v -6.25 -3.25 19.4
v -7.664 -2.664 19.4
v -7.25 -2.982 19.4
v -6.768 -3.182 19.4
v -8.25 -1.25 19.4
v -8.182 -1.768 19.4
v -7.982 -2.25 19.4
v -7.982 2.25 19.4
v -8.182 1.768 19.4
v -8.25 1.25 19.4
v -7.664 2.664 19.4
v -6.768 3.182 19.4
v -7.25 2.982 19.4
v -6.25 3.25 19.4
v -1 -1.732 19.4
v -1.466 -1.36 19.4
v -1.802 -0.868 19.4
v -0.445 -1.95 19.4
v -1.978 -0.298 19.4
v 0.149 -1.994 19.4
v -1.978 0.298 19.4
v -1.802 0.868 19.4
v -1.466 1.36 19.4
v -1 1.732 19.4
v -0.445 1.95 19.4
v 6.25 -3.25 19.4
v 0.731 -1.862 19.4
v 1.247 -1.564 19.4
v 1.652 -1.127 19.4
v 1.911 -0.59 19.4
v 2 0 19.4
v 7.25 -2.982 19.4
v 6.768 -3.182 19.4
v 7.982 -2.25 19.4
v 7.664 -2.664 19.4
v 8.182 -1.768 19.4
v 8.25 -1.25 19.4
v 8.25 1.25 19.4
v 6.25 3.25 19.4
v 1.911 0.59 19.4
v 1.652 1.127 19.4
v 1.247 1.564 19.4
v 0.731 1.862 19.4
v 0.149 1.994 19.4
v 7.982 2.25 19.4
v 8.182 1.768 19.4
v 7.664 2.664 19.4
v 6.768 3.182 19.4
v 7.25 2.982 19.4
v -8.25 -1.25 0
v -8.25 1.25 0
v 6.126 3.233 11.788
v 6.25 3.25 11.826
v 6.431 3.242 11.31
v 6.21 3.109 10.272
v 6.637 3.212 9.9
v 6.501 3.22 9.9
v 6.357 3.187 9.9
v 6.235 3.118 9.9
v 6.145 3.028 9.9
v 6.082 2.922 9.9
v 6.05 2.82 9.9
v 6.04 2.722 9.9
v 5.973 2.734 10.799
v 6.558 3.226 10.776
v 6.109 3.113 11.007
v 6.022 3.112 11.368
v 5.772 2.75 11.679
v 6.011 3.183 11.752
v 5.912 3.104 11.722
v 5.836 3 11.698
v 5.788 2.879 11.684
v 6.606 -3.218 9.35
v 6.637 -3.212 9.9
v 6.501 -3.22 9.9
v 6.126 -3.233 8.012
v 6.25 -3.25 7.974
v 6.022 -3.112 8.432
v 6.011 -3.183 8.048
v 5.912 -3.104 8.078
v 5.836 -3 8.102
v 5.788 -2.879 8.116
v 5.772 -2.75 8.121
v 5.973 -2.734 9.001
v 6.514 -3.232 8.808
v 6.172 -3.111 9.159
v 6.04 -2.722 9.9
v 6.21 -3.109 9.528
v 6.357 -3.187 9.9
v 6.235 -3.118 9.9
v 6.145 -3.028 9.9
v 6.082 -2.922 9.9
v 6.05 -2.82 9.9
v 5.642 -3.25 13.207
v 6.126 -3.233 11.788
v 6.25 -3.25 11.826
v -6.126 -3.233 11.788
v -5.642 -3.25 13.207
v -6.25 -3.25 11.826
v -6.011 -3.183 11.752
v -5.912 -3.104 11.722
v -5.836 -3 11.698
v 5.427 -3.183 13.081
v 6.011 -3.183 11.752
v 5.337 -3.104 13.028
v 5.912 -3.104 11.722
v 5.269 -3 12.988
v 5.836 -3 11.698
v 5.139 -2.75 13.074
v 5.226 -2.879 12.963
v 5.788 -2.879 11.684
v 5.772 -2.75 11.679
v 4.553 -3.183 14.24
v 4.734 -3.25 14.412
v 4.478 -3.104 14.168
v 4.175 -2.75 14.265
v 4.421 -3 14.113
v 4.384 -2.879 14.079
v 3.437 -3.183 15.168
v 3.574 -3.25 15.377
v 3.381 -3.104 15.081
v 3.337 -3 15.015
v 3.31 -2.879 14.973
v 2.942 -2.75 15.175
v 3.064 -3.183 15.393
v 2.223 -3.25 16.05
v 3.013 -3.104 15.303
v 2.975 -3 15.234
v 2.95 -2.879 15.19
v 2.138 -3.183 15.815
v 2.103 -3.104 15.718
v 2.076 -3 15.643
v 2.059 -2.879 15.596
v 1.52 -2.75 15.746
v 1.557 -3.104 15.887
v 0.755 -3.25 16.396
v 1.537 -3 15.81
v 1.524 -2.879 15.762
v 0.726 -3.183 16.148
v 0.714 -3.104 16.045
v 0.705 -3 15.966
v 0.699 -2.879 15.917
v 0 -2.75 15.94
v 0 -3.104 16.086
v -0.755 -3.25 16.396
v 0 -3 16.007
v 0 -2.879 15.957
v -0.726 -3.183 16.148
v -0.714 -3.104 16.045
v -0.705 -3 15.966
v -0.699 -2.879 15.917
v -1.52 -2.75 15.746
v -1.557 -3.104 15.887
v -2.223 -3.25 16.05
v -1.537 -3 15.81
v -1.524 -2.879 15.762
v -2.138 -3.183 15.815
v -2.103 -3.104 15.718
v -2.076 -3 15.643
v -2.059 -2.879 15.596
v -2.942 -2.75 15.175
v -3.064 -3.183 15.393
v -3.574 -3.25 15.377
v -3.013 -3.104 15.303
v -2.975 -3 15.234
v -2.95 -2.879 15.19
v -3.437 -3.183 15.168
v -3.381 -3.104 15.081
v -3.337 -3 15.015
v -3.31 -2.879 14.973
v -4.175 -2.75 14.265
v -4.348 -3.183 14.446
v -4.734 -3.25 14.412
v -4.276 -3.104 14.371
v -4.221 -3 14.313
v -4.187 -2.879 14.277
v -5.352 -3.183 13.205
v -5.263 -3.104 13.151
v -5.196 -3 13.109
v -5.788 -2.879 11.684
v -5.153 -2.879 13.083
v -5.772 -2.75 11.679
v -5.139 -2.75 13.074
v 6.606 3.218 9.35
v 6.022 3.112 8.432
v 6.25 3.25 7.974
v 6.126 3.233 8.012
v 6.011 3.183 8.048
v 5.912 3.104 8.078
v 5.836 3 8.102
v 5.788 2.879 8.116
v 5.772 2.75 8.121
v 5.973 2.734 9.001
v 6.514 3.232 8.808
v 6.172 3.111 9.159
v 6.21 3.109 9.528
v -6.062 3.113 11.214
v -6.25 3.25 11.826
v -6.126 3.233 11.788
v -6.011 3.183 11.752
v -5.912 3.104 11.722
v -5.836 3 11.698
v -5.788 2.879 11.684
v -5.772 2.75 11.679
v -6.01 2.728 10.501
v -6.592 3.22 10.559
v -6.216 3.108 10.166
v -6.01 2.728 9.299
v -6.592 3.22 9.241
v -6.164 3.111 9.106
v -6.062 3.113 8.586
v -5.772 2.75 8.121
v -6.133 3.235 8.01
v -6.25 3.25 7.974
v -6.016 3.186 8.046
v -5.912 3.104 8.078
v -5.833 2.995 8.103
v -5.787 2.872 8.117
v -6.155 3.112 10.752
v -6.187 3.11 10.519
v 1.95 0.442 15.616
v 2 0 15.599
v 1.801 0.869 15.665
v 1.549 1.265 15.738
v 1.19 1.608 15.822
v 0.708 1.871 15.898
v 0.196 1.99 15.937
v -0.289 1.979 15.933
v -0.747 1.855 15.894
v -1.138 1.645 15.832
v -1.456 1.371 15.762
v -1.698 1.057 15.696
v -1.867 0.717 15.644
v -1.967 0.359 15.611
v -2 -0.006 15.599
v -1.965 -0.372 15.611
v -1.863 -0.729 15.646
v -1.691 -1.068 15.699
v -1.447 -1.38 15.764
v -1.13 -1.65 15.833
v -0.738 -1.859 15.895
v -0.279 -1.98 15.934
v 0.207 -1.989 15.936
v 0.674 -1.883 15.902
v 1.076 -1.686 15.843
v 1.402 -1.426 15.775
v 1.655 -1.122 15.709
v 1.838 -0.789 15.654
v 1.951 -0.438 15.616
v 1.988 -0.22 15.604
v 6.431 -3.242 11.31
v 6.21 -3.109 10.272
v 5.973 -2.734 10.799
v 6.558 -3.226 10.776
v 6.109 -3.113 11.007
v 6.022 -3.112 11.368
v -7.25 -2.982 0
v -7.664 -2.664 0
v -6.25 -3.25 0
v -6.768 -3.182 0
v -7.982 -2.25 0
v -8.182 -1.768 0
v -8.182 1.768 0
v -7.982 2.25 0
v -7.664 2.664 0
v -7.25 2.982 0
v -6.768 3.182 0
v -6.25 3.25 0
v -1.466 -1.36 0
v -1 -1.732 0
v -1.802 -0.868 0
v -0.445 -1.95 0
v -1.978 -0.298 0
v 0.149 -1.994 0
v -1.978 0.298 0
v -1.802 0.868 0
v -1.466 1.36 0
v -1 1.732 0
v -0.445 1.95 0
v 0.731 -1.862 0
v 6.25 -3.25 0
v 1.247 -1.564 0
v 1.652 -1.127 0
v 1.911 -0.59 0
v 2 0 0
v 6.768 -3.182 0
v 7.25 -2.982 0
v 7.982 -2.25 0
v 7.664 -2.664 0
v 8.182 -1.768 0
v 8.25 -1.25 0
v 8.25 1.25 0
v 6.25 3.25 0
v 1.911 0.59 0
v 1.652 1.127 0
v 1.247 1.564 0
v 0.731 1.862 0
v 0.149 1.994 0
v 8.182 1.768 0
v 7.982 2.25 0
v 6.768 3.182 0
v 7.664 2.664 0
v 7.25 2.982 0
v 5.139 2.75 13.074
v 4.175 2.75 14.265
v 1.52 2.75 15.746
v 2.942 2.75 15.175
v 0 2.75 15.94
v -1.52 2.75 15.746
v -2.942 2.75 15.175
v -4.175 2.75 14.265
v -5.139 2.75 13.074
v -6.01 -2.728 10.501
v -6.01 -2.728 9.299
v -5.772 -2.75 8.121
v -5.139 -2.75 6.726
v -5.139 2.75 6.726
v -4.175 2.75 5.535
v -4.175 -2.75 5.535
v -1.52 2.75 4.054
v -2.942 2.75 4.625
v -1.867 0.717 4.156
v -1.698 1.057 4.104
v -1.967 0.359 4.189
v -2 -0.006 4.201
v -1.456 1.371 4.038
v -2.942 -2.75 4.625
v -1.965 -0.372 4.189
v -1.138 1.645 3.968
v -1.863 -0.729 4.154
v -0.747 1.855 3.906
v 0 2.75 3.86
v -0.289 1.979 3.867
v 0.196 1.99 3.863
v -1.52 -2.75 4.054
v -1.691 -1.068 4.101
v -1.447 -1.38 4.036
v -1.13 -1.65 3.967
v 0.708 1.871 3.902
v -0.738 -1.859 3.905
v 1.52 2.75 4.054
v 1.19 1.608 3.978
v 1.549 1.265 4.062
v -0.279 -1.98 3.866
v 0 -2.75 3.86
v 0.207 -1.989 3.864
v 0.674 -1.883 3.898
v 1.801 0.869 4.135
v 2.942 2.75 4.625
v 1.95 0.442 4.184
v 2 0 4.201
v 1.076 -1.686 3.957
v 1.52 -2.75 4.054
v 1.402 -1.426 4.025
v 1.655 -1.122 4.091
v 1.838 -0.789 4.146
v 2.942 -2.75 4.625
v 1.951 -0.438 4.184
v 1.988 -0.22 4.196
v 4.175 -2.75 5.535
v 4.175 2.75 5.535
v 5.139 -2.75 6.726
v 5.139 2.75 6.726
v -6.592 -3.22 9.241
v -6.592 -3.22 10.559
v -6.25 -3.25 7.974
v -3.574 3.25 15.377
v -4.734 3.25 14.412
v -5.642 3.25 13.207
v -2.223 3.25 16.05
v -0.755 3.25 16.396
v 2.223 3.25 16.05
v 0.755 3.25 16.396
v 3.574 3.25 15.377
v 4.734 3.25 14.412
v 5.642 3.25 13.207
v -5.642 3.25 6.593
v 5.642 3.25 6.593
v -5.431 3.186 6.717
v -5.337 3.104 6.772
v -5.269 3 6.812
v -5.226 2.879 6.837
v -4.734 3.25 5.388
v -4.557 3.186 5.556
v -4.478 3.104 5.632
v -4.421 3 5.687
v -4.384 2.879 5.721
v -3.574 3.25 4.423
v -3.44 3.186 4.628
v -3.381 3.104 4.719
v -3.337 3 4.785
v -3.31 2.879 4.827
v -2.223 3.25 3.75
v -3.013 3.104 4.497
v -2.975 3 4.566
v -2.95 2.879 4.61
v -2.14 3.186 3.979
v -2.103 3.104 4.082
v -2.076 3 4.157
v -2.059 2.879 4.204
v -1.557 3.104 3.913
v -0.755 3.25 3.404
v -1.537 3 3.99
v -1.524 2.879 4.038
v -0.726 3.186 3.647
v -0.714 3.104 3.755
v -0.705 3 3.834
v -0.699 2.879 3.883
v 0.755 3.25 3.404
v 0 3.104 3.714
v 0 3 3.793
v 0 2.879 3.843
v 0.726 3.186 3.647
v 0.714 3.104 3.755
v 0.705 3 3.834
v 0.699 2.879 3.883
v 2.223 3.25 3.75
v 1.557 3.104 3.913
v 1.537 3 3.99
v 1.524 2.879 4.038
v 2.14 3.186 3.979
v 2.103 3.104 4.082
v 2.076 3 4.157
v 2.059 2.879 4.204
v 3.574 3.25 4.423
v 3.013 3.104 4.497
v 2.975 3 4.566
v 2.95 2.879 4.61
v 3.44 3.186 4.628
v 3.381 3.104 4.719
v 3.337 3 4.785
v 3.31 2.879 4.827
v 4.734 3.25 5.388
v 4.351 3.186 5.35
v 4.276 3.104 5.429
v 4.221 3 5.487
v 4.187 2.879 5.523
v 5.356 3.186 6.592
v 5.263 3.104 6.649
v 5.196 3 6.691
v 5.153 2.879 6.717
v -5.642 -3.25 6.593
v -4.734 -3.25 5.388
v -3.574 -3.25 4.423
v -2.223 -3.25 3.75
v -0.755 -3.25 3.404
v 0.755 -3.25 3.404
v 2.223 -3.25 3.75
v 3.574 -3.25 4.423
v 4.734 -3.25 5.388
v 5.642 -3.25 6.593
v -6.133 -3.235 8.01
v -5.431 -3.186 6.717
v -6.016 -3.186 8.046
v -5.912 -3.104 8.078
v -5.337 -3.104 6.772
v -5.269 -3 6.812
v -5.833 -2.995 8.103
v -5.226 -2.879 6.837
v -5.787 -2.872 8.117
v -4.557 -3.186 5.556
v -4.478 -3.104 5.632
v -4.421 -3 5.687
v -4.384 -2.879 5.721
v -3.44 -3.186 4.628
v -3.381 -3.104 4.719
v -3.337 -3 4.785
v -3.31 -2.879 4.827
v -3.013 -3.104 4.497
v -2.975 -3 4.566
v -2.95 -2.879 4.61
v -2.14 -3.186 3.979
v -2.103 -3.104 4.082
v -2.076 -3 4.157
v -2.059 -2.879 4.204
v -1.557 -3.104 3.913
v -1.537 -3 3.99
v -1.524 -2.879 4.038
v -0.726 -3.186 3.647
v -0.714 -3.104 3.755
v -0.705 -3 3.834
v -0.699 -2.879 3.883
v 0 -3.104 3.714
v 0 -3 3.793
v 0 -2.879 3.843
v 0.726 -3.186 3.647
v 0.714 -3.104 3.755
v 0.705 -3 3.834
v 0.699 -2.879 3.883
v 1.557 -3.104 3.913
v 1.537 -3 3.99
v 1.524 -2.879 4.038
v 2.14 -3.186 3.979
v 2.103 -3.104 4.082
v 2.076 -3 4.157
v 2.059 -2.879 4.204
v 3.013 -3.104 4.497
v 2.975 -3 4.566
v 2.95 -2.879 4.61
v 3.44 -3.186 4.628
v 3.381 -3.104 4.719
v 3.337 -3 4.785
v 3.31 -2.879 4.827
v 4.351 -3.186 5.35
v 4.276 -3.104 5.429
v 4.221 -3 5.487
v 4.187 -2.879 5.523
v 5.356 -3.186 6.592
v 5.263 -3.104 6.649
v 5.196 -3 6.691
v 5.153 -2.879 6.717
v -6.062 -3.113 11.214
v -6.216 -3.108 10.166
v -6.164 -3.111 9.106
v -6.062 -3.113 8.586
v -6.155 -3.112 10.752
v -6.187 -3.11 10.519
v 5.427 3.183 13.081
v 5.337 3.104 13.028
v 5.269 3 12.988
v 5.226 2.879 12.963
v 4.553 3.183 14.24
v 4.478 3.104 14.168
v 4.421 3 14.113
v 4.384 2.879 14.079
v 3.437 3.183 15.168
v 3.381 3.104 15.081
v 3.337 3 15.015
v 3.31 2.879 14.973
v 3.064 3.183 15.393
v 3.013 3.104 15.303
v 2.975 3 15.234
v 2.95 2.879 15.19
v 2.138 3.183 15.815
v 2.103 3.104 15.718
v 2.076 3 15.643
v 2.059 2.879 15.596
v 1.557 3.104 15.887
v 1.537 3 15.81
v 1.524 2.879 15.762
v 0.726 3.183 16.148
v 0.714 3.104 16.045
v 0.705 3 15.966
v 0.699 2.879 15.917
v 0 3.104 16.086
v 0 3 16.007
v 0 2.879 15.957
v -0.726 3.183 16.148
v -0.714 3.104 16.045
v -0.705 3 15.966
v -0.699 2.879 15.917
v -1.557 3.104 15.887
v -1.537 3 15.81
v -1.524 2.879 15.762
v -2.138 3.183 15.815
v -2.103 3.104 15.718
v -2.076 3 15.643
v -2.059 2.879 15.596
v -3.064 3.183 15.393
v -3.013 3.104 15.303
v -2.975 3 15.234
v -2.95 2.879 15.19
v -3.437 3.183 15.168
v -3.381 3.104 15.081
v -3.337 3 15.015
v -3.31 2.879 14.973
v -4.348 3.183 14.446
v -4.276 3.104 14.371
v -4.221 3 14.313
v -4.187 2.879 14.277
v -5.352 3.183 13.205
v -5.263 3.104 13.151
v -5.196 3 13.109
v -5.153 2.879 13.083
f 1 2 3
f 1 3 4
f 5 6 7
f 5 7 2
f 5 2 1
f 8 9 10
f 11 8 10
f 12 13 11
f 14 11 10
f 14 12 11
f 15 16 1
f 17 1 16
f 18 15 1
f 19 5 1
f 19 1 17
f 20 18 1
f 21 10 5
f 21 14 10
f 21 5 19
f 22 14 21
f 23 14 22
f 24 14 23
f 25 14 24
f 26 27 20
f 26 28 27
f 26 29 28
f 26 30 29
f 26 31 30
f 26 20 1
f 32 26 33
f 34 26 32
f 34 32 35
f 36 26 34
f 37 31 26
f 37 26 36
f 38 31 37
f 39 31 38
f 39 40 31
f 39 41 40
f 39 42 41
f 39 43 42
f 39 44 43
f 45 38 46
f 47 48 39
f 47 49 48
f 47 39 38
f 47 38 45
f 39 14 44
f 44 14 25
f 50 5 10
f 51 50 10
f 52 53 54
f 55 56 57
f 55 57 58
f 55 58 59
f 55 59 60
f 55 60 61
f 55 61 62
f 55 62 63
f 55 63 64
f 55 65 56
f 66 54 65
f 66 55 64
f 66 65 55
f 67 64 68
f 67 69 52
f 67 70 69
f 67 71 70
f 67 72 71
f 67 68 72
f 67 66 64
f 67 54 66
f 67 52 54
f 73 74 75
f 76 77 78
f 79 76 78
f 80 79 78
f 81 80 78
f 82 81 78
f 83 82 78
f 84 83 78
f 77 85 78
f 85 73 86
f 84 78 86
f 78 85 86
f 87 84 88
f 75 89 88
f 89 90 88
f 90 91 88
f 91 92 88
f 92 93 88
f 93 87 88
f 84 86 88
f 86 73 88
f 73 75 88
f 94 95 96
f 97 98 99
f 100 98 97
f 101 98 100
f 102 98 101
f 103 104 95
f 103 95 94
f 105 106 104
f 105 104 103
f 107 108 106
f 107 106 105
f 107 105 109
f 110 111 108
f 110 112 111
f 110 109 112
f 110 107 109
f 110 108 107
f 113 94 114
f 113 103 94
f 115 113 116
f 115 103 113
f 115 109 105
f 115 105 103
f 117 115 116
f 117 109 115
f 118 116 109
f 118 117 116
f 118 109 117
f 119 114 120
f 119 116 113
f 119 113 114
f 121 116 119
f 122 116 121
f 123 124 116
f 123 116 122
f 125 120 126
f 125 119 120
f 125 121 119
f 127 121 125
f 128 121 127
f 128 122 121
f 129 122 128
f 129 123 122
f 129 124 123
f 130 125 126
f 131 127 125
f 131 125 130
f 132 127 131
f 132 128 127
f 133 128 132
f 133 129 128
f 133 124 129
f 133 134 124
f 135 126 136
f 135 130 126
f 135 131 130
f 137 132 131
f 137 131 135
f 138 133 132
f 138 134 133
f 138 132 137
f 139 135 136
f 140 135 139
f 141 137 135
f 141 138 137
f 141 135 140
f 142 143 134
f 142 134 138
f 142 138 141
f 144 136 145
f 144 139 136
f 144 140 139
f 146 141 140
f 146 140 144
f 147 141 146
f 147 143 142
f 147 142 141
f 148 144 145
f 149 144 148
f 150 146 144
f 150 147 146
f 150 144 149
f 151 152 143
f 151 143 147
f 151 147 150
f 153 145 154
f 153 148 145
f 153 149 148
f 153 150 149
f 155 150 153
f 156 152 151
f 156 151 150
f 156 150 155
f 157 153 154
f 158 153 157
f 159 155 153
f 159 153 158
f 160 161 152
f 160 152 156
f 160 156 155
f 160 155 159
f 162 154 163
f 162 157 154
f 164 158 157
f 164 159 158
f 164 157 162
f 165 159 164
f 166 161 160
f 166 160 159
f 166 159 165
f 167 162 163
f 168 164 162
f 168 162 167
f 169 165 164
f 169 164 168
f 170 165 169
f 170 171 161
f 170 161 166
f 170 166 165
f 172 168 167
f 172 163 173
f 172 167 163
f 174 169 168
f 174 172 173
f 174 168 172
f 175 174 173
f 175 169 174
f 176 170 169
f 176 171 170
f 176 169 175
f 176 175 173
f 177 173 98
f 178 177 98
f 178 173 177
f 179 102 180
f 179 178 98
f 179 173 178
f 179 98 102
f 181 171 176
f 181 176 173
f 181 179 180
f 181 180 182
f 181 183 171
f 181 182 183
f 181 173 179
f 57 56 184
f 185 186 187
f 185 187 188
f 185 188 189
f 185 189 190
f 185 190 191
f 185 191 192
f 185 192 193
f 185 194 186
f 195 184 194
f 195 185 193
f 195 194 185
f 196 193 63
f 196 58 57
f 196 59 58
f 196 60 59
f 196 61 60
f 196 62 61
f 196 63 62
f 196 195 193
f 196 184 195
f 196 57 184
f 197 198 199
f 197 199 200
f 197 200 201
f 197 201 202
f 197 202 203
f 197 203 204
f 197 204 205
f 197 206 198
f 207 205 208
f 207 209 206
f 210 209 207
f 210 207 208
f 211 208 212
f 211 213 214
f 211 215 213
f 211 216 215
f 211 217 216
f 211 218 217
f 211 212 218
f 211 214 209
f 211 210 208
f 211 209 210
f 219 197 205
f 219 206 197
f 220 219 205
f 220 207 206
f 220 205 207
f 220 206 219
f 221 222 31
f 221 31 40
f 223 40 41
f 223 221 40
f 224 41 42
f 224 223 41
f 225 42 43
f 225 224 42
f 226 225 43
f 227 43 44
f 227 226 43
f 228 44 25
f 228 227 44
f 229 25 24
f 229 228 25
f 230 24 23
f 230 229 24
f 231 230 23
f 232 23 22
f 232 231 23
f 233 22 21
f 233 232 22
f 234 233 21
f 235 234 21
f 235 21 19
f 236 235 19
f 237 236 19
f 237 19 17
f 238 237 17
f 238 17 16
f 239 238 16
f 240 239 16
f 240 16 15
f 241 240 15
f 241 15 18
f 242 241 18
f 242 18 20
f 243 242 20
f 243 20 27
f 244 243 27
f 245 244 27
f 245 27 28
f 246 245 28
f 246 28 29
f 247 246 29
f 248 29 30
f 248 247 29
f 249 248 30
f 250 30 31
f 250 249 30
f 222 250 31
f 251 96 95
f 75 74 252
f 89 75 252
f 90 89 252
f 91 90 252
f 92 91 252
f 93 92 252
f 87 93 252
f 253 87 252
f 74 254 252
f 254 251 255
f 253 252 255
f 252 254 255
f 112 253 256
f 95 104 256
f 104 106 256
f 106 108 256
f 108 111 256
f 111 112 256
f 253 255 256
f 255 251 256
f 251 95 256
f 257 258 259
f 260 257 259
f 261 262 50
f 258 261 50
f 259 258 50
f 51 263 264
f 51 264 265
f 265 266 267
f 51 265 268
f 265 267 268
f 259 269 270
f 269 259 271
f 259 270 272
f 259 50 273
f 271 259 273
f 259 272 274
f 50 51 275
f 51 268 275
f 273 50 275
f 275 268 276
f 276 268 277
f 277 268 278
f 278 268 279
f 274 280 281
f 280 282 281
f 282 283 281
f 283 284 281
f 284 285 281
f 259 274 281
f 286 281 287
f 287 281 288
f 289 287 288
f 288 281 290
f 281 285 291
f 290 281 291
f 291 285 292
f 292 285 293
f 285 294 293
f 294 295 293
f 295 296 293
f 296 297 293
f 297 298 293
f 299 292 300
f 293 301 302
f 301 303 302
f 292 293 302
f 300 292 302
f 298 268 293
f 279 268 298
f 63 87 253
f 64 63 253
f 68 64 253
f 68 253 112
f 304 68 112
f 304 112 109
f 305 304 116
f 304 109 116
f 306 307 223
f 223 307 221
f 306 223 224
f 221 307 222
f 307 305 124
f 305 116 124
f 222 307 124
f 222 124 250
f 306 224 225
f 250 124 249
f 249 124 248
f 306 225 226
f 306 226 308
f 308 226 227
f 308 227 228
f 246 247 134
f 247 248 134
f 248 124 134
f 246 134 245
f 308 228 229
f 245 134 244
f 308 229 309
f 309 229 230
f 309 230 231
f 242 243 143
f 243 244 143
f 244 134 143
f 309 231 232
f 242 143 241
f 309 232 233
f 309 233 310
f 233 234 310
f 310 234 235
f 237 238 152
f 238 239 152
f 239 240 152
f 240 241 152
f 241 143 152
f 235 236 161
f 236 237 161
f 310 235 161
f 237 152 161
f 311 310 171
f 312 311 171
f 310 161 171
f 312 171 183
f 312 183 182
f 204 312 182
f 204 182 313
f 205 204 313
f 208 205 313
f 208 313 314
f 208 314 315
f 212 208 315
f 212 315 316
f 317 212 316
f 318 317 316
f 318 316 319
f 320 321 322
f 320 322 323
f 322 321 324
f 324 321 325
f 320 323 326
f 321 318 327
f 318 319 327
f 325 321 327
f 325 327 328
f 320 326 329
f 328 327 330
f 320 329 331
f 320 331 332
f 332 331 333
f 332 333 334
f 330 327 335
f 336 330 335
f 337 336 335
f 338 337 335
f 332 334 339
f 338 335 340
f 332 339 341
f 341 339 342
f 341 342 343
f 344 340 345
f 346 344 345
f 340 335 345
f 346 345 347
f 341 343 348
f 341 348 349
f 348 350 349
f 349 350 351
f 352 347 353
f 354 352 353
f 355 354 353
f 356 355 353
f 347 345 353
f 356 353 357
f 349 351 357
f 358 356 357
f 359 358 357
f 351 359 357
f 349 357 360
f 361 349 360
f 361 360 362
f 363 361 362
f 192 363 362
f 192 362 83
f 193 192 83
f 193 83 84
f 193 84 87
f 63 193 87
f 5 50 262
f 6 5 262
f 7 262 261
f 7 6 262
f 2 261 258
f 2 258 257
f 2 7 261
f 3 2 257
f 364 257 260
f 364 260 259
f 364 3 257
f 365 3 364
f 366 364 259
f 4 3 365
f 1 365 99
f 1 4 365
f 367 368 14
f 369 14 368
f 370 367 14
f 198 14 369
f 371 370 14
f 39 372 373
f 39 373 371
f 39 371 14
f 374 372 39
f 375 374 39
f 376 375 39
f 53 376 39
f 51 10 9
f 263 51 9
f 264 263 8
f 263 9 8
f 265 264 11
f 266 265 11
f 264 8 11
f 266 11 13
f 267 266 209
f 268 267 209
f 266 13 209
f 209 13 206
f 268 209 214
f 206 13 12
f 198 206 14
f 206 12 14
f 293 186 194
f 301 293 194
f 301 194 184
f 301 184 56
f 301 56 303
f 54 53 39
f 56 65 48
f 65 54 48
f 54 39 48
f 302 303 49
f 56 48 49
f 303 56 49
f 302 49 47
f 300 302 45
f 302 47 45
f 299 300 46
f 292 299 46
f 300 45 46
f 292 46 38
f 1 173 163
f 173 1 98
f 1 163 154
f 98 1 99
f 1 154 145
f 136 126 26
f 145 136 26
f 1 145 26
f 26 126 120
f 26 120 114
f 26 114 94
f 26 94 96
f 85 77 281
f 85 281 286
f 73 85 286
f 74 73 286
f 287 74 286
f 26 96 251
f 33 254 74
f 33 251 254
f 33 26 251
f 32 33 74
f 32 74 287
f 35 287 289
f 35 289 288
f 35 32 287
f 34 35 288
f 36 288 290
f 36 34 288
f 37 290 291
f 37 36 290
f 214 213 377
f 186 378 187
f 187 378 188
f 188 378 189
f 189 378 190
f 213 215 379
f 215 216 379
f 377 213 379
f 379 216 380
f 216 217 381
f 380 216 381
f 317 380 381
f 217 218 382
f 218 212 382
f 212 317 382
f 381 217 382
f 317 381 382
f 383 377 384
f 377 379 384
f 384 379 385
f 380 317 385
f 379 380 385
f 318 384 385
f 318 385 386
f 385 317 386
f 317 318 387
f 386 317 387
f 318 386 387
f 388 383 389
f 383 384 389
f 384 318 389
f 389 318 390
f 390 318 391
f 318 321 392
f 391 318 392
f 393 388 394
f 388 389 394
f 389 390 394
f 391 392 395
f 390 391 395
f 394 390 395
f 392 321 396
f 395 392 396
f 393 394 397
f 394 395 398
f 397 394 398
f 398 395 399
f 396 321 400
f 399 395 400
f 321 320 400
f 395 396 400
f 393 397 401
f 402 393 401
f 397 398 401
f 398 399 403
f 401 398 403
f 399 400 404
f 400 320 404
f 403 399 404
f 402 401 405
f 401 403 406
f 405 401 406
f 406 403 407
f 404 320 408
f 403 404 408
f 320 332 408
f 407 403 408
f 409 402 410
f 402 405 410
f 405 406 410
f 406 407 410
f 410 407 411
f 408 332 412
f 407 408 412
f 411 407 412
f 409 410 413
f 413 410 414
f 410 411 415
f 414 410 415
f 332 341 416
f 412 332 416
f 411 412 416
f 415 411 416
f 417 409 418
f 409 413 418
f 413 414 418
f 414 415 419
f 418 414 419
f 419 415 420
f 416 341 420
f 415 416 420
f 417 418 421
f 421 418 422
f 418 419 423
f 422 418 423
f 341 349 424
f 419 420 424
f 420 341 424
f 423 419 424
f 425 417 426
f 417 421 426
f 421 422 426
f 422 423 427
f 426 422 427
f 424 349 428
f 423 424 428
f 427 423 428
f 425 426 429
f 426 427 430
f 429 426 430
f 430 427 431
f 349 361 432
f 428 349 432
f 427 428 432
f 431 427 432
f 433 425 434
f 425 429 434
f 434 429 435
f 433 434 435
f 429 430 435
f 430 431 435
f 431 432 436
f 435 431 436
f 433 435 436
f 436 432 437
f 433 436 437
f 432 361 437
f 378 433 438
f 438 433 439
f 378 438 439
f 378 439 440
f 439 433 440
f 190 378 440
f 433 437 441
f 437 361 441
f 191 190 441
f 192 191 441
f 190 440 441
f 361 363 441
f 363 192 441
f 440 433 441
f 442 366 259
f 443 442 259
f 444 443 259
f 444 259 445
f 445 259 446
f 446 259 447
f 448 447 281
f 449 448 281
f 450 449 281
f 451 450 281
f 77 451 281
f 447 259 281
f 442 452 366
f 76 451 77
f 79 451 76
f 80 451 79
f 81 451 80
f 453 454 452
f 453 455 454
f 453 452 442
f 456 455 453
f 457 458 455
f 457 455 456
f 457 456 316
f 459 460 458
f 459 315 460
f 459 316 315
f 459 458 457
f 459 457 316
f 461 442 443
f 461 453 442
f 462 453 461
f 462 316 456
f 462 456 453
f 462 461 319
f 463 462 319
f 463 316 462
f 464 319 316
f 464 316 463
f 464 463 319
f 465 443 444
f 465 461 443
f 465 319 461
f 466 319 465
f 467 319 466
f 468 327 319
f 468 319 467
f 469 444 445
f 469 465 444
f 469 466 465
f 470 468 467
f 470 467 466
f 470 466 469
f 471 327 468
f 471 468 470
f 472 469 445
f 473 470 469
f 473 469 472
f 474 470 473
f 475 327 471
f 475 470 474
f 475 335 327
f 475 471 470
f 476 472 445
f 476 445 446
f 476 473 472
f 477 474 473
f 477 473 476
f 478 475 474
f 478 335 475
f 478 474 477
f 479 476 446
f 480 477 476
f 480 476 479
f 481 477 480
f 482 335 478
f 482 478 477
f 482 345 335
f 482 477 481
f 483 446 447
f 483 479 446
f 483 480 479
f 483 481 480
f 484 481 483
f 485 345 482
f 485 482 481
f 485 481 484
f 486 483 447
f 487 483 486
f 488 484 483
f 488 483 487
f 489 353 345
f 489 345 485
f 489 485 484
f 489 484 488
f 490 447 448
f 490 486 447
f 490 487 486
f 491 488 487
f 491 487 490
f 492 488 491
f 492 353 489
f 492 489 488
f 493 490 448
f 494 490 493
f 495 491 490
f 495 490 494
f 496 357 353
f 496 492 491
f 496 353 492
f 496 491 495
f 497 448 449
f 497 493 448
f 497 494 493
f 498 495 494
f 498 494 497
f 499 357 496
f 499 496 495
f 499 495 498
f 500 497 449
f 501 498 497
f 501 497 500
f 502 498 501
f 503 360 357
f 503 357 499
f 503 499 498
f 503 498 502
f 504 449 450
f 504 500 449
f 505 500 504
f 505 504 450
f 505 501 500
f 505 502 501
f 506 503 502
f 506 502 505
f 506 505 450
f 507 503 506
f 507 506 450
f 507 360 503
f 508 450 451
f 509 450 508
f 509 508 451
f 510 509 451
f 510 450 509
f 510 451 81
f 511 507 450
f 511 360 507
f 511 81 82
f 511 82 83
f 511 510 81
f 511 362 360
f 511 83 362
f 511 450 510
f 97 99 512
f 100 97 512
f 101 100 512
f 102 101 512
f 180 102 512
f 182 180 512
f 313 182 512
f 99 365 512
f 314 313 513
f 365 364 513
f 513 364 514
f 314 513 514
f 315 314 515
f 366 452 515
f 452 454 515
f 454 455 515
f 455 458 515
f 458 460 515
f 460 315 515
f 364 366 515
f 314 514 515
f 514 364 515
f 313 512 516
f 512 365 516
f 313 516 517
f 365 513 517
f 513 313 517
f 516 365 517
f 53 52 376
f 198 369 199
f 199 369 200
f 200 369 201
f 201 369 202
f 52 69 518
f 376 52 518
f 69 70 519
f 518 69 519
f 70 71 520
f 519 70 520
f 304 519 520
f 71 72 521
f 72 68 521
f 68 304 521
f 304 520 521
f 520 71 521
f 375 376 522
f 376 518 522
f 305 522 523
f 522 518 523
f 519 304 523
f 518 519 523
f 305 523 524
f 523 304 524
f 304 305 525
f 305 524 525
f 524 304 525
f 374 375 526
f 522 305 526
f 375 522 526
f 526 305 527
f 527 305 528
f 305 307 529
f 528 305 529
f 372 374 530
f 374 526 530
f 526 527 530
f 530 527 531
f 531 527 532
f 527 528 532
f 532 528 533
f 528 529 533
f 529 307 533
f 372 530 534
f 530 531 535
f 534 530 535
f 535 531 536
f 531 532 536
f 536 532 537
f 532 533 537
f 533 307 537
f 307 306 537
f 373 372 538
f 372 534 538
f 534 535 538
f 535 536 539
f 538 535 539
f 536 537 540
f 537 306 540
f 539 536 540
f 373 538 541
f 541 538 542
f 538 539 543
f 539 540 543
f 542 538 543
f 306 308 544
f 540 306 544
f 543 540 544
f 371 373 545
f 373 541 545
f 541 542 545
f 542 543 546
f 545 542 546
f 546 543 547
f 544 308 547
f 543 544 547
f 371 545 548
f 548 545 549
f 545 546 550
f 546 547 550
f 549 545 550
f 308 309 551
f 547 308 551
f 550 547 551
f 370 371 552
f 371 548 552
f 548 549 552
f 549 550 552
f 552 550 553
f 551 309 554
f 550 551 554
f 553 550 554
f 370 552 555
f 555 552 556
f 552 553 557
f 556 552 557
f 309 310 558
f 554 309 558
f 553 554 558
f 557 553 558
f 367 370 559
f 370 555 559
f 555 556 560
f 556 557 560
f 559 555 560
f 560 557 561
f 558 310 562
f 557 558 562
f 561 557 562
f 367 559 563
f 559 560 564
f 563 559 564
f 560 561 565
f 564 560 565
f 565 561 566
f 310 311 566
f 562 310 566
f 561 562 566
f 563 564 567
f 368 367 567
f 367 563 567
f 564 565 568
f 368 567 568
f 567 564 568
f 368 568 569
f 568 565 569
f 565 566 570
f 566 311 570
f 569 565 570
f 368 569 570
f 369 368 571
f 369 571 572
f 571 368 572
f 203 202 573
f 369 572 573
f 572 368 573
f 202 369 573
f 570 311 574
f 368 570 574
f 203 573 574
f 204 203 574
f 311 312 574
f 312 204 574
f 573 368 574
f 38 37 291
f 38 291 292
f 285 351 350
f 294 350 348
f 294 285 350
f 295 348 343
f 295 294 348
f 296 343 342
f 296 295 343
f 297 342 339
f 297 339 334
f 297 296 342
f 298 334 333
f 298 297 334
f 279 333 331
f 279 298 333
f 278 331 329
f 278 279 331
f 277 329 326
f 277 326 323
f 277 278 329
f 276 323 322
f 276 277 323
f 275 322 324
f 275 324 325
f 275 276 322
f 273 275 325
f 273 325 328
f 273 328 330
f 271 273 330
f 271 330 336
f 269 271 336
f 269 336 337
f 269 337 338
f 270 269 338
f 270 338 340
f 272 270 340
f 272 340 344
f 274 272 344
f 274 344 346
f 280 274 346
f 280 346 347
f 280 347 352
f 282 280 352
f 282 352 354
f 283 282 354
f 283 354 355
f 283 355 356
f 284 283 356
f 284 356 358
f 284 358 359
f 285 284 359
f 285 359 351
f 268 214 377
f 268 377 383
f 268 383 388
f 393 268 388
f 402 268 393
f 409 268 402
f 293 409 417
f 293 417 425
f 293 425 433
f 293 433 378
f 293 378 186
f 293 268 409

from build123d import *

# Parameters (mm, degrees)
F0_W          = 16.5
F0_H          = 6.5
F0_R          = 2
F1_DEPTH      = 19.4
F2_R          = 6.04
F3_DEPTH      = 25
F3_DEPTH_BACK = 25
F4_DEPTH      = 3
F5_R          = 2
F6_R          = 0.5


with BuildPart() as f1:
    # F0 (on Top) → F1 (new body)
    with BuildSketch(Plane.XY):
        Rectangle(F0_W, F0_H)
        Circle(F0_R, mode=Mode.SUBTRACT)
    extrude(amount=F1_DEPTH)

    # F2 (on face) → F3 (cut, two sides)
    with BuildSketch(Plane.XZ.offset(3.25)) as f3_sk:
        with Locations((0, 9.9)):
            Circle(F2_R)
    extrude(amount=-F3_DEPTH, mode=Mode.SUBTRACT)
    extrude(f3_sk.sketch, amount=-F3_DEPTH_BACK, mode=Mode.SUBTRACT)

    # F0 (on Top) → F4 (cut)
    with BuildSketch(Plane.XY):
        Rectangle(F0_W, F0_H)
        Circle(F0_R, mode=Mode.SUBTRACT)
    extrude(amount=-F4_DEPTH, mode=Mode.SUBTRACT)

    # F5
    f5_edges = [f1.edges().sort_by_distance(p)[0] for p in [
        (8.25, -3.25, 9.7),
        (-8.25, -3.25, 9.7),
        (-8.25, 3.25, 9.7),
        (8.25, 3.25, 9.7),
    ]]
    fillet(f5_edges, radius=F5_R)

    # F6
    f6_edges = [f1.edges().sort_by_distance(p)[0] for p in [
        (-6.04, -3.25, 9.9),
        (-6.04, 3.25, 9.9),
    ]]
    fillet(f6_edges, radius=F6_R)


solid = f1.part
